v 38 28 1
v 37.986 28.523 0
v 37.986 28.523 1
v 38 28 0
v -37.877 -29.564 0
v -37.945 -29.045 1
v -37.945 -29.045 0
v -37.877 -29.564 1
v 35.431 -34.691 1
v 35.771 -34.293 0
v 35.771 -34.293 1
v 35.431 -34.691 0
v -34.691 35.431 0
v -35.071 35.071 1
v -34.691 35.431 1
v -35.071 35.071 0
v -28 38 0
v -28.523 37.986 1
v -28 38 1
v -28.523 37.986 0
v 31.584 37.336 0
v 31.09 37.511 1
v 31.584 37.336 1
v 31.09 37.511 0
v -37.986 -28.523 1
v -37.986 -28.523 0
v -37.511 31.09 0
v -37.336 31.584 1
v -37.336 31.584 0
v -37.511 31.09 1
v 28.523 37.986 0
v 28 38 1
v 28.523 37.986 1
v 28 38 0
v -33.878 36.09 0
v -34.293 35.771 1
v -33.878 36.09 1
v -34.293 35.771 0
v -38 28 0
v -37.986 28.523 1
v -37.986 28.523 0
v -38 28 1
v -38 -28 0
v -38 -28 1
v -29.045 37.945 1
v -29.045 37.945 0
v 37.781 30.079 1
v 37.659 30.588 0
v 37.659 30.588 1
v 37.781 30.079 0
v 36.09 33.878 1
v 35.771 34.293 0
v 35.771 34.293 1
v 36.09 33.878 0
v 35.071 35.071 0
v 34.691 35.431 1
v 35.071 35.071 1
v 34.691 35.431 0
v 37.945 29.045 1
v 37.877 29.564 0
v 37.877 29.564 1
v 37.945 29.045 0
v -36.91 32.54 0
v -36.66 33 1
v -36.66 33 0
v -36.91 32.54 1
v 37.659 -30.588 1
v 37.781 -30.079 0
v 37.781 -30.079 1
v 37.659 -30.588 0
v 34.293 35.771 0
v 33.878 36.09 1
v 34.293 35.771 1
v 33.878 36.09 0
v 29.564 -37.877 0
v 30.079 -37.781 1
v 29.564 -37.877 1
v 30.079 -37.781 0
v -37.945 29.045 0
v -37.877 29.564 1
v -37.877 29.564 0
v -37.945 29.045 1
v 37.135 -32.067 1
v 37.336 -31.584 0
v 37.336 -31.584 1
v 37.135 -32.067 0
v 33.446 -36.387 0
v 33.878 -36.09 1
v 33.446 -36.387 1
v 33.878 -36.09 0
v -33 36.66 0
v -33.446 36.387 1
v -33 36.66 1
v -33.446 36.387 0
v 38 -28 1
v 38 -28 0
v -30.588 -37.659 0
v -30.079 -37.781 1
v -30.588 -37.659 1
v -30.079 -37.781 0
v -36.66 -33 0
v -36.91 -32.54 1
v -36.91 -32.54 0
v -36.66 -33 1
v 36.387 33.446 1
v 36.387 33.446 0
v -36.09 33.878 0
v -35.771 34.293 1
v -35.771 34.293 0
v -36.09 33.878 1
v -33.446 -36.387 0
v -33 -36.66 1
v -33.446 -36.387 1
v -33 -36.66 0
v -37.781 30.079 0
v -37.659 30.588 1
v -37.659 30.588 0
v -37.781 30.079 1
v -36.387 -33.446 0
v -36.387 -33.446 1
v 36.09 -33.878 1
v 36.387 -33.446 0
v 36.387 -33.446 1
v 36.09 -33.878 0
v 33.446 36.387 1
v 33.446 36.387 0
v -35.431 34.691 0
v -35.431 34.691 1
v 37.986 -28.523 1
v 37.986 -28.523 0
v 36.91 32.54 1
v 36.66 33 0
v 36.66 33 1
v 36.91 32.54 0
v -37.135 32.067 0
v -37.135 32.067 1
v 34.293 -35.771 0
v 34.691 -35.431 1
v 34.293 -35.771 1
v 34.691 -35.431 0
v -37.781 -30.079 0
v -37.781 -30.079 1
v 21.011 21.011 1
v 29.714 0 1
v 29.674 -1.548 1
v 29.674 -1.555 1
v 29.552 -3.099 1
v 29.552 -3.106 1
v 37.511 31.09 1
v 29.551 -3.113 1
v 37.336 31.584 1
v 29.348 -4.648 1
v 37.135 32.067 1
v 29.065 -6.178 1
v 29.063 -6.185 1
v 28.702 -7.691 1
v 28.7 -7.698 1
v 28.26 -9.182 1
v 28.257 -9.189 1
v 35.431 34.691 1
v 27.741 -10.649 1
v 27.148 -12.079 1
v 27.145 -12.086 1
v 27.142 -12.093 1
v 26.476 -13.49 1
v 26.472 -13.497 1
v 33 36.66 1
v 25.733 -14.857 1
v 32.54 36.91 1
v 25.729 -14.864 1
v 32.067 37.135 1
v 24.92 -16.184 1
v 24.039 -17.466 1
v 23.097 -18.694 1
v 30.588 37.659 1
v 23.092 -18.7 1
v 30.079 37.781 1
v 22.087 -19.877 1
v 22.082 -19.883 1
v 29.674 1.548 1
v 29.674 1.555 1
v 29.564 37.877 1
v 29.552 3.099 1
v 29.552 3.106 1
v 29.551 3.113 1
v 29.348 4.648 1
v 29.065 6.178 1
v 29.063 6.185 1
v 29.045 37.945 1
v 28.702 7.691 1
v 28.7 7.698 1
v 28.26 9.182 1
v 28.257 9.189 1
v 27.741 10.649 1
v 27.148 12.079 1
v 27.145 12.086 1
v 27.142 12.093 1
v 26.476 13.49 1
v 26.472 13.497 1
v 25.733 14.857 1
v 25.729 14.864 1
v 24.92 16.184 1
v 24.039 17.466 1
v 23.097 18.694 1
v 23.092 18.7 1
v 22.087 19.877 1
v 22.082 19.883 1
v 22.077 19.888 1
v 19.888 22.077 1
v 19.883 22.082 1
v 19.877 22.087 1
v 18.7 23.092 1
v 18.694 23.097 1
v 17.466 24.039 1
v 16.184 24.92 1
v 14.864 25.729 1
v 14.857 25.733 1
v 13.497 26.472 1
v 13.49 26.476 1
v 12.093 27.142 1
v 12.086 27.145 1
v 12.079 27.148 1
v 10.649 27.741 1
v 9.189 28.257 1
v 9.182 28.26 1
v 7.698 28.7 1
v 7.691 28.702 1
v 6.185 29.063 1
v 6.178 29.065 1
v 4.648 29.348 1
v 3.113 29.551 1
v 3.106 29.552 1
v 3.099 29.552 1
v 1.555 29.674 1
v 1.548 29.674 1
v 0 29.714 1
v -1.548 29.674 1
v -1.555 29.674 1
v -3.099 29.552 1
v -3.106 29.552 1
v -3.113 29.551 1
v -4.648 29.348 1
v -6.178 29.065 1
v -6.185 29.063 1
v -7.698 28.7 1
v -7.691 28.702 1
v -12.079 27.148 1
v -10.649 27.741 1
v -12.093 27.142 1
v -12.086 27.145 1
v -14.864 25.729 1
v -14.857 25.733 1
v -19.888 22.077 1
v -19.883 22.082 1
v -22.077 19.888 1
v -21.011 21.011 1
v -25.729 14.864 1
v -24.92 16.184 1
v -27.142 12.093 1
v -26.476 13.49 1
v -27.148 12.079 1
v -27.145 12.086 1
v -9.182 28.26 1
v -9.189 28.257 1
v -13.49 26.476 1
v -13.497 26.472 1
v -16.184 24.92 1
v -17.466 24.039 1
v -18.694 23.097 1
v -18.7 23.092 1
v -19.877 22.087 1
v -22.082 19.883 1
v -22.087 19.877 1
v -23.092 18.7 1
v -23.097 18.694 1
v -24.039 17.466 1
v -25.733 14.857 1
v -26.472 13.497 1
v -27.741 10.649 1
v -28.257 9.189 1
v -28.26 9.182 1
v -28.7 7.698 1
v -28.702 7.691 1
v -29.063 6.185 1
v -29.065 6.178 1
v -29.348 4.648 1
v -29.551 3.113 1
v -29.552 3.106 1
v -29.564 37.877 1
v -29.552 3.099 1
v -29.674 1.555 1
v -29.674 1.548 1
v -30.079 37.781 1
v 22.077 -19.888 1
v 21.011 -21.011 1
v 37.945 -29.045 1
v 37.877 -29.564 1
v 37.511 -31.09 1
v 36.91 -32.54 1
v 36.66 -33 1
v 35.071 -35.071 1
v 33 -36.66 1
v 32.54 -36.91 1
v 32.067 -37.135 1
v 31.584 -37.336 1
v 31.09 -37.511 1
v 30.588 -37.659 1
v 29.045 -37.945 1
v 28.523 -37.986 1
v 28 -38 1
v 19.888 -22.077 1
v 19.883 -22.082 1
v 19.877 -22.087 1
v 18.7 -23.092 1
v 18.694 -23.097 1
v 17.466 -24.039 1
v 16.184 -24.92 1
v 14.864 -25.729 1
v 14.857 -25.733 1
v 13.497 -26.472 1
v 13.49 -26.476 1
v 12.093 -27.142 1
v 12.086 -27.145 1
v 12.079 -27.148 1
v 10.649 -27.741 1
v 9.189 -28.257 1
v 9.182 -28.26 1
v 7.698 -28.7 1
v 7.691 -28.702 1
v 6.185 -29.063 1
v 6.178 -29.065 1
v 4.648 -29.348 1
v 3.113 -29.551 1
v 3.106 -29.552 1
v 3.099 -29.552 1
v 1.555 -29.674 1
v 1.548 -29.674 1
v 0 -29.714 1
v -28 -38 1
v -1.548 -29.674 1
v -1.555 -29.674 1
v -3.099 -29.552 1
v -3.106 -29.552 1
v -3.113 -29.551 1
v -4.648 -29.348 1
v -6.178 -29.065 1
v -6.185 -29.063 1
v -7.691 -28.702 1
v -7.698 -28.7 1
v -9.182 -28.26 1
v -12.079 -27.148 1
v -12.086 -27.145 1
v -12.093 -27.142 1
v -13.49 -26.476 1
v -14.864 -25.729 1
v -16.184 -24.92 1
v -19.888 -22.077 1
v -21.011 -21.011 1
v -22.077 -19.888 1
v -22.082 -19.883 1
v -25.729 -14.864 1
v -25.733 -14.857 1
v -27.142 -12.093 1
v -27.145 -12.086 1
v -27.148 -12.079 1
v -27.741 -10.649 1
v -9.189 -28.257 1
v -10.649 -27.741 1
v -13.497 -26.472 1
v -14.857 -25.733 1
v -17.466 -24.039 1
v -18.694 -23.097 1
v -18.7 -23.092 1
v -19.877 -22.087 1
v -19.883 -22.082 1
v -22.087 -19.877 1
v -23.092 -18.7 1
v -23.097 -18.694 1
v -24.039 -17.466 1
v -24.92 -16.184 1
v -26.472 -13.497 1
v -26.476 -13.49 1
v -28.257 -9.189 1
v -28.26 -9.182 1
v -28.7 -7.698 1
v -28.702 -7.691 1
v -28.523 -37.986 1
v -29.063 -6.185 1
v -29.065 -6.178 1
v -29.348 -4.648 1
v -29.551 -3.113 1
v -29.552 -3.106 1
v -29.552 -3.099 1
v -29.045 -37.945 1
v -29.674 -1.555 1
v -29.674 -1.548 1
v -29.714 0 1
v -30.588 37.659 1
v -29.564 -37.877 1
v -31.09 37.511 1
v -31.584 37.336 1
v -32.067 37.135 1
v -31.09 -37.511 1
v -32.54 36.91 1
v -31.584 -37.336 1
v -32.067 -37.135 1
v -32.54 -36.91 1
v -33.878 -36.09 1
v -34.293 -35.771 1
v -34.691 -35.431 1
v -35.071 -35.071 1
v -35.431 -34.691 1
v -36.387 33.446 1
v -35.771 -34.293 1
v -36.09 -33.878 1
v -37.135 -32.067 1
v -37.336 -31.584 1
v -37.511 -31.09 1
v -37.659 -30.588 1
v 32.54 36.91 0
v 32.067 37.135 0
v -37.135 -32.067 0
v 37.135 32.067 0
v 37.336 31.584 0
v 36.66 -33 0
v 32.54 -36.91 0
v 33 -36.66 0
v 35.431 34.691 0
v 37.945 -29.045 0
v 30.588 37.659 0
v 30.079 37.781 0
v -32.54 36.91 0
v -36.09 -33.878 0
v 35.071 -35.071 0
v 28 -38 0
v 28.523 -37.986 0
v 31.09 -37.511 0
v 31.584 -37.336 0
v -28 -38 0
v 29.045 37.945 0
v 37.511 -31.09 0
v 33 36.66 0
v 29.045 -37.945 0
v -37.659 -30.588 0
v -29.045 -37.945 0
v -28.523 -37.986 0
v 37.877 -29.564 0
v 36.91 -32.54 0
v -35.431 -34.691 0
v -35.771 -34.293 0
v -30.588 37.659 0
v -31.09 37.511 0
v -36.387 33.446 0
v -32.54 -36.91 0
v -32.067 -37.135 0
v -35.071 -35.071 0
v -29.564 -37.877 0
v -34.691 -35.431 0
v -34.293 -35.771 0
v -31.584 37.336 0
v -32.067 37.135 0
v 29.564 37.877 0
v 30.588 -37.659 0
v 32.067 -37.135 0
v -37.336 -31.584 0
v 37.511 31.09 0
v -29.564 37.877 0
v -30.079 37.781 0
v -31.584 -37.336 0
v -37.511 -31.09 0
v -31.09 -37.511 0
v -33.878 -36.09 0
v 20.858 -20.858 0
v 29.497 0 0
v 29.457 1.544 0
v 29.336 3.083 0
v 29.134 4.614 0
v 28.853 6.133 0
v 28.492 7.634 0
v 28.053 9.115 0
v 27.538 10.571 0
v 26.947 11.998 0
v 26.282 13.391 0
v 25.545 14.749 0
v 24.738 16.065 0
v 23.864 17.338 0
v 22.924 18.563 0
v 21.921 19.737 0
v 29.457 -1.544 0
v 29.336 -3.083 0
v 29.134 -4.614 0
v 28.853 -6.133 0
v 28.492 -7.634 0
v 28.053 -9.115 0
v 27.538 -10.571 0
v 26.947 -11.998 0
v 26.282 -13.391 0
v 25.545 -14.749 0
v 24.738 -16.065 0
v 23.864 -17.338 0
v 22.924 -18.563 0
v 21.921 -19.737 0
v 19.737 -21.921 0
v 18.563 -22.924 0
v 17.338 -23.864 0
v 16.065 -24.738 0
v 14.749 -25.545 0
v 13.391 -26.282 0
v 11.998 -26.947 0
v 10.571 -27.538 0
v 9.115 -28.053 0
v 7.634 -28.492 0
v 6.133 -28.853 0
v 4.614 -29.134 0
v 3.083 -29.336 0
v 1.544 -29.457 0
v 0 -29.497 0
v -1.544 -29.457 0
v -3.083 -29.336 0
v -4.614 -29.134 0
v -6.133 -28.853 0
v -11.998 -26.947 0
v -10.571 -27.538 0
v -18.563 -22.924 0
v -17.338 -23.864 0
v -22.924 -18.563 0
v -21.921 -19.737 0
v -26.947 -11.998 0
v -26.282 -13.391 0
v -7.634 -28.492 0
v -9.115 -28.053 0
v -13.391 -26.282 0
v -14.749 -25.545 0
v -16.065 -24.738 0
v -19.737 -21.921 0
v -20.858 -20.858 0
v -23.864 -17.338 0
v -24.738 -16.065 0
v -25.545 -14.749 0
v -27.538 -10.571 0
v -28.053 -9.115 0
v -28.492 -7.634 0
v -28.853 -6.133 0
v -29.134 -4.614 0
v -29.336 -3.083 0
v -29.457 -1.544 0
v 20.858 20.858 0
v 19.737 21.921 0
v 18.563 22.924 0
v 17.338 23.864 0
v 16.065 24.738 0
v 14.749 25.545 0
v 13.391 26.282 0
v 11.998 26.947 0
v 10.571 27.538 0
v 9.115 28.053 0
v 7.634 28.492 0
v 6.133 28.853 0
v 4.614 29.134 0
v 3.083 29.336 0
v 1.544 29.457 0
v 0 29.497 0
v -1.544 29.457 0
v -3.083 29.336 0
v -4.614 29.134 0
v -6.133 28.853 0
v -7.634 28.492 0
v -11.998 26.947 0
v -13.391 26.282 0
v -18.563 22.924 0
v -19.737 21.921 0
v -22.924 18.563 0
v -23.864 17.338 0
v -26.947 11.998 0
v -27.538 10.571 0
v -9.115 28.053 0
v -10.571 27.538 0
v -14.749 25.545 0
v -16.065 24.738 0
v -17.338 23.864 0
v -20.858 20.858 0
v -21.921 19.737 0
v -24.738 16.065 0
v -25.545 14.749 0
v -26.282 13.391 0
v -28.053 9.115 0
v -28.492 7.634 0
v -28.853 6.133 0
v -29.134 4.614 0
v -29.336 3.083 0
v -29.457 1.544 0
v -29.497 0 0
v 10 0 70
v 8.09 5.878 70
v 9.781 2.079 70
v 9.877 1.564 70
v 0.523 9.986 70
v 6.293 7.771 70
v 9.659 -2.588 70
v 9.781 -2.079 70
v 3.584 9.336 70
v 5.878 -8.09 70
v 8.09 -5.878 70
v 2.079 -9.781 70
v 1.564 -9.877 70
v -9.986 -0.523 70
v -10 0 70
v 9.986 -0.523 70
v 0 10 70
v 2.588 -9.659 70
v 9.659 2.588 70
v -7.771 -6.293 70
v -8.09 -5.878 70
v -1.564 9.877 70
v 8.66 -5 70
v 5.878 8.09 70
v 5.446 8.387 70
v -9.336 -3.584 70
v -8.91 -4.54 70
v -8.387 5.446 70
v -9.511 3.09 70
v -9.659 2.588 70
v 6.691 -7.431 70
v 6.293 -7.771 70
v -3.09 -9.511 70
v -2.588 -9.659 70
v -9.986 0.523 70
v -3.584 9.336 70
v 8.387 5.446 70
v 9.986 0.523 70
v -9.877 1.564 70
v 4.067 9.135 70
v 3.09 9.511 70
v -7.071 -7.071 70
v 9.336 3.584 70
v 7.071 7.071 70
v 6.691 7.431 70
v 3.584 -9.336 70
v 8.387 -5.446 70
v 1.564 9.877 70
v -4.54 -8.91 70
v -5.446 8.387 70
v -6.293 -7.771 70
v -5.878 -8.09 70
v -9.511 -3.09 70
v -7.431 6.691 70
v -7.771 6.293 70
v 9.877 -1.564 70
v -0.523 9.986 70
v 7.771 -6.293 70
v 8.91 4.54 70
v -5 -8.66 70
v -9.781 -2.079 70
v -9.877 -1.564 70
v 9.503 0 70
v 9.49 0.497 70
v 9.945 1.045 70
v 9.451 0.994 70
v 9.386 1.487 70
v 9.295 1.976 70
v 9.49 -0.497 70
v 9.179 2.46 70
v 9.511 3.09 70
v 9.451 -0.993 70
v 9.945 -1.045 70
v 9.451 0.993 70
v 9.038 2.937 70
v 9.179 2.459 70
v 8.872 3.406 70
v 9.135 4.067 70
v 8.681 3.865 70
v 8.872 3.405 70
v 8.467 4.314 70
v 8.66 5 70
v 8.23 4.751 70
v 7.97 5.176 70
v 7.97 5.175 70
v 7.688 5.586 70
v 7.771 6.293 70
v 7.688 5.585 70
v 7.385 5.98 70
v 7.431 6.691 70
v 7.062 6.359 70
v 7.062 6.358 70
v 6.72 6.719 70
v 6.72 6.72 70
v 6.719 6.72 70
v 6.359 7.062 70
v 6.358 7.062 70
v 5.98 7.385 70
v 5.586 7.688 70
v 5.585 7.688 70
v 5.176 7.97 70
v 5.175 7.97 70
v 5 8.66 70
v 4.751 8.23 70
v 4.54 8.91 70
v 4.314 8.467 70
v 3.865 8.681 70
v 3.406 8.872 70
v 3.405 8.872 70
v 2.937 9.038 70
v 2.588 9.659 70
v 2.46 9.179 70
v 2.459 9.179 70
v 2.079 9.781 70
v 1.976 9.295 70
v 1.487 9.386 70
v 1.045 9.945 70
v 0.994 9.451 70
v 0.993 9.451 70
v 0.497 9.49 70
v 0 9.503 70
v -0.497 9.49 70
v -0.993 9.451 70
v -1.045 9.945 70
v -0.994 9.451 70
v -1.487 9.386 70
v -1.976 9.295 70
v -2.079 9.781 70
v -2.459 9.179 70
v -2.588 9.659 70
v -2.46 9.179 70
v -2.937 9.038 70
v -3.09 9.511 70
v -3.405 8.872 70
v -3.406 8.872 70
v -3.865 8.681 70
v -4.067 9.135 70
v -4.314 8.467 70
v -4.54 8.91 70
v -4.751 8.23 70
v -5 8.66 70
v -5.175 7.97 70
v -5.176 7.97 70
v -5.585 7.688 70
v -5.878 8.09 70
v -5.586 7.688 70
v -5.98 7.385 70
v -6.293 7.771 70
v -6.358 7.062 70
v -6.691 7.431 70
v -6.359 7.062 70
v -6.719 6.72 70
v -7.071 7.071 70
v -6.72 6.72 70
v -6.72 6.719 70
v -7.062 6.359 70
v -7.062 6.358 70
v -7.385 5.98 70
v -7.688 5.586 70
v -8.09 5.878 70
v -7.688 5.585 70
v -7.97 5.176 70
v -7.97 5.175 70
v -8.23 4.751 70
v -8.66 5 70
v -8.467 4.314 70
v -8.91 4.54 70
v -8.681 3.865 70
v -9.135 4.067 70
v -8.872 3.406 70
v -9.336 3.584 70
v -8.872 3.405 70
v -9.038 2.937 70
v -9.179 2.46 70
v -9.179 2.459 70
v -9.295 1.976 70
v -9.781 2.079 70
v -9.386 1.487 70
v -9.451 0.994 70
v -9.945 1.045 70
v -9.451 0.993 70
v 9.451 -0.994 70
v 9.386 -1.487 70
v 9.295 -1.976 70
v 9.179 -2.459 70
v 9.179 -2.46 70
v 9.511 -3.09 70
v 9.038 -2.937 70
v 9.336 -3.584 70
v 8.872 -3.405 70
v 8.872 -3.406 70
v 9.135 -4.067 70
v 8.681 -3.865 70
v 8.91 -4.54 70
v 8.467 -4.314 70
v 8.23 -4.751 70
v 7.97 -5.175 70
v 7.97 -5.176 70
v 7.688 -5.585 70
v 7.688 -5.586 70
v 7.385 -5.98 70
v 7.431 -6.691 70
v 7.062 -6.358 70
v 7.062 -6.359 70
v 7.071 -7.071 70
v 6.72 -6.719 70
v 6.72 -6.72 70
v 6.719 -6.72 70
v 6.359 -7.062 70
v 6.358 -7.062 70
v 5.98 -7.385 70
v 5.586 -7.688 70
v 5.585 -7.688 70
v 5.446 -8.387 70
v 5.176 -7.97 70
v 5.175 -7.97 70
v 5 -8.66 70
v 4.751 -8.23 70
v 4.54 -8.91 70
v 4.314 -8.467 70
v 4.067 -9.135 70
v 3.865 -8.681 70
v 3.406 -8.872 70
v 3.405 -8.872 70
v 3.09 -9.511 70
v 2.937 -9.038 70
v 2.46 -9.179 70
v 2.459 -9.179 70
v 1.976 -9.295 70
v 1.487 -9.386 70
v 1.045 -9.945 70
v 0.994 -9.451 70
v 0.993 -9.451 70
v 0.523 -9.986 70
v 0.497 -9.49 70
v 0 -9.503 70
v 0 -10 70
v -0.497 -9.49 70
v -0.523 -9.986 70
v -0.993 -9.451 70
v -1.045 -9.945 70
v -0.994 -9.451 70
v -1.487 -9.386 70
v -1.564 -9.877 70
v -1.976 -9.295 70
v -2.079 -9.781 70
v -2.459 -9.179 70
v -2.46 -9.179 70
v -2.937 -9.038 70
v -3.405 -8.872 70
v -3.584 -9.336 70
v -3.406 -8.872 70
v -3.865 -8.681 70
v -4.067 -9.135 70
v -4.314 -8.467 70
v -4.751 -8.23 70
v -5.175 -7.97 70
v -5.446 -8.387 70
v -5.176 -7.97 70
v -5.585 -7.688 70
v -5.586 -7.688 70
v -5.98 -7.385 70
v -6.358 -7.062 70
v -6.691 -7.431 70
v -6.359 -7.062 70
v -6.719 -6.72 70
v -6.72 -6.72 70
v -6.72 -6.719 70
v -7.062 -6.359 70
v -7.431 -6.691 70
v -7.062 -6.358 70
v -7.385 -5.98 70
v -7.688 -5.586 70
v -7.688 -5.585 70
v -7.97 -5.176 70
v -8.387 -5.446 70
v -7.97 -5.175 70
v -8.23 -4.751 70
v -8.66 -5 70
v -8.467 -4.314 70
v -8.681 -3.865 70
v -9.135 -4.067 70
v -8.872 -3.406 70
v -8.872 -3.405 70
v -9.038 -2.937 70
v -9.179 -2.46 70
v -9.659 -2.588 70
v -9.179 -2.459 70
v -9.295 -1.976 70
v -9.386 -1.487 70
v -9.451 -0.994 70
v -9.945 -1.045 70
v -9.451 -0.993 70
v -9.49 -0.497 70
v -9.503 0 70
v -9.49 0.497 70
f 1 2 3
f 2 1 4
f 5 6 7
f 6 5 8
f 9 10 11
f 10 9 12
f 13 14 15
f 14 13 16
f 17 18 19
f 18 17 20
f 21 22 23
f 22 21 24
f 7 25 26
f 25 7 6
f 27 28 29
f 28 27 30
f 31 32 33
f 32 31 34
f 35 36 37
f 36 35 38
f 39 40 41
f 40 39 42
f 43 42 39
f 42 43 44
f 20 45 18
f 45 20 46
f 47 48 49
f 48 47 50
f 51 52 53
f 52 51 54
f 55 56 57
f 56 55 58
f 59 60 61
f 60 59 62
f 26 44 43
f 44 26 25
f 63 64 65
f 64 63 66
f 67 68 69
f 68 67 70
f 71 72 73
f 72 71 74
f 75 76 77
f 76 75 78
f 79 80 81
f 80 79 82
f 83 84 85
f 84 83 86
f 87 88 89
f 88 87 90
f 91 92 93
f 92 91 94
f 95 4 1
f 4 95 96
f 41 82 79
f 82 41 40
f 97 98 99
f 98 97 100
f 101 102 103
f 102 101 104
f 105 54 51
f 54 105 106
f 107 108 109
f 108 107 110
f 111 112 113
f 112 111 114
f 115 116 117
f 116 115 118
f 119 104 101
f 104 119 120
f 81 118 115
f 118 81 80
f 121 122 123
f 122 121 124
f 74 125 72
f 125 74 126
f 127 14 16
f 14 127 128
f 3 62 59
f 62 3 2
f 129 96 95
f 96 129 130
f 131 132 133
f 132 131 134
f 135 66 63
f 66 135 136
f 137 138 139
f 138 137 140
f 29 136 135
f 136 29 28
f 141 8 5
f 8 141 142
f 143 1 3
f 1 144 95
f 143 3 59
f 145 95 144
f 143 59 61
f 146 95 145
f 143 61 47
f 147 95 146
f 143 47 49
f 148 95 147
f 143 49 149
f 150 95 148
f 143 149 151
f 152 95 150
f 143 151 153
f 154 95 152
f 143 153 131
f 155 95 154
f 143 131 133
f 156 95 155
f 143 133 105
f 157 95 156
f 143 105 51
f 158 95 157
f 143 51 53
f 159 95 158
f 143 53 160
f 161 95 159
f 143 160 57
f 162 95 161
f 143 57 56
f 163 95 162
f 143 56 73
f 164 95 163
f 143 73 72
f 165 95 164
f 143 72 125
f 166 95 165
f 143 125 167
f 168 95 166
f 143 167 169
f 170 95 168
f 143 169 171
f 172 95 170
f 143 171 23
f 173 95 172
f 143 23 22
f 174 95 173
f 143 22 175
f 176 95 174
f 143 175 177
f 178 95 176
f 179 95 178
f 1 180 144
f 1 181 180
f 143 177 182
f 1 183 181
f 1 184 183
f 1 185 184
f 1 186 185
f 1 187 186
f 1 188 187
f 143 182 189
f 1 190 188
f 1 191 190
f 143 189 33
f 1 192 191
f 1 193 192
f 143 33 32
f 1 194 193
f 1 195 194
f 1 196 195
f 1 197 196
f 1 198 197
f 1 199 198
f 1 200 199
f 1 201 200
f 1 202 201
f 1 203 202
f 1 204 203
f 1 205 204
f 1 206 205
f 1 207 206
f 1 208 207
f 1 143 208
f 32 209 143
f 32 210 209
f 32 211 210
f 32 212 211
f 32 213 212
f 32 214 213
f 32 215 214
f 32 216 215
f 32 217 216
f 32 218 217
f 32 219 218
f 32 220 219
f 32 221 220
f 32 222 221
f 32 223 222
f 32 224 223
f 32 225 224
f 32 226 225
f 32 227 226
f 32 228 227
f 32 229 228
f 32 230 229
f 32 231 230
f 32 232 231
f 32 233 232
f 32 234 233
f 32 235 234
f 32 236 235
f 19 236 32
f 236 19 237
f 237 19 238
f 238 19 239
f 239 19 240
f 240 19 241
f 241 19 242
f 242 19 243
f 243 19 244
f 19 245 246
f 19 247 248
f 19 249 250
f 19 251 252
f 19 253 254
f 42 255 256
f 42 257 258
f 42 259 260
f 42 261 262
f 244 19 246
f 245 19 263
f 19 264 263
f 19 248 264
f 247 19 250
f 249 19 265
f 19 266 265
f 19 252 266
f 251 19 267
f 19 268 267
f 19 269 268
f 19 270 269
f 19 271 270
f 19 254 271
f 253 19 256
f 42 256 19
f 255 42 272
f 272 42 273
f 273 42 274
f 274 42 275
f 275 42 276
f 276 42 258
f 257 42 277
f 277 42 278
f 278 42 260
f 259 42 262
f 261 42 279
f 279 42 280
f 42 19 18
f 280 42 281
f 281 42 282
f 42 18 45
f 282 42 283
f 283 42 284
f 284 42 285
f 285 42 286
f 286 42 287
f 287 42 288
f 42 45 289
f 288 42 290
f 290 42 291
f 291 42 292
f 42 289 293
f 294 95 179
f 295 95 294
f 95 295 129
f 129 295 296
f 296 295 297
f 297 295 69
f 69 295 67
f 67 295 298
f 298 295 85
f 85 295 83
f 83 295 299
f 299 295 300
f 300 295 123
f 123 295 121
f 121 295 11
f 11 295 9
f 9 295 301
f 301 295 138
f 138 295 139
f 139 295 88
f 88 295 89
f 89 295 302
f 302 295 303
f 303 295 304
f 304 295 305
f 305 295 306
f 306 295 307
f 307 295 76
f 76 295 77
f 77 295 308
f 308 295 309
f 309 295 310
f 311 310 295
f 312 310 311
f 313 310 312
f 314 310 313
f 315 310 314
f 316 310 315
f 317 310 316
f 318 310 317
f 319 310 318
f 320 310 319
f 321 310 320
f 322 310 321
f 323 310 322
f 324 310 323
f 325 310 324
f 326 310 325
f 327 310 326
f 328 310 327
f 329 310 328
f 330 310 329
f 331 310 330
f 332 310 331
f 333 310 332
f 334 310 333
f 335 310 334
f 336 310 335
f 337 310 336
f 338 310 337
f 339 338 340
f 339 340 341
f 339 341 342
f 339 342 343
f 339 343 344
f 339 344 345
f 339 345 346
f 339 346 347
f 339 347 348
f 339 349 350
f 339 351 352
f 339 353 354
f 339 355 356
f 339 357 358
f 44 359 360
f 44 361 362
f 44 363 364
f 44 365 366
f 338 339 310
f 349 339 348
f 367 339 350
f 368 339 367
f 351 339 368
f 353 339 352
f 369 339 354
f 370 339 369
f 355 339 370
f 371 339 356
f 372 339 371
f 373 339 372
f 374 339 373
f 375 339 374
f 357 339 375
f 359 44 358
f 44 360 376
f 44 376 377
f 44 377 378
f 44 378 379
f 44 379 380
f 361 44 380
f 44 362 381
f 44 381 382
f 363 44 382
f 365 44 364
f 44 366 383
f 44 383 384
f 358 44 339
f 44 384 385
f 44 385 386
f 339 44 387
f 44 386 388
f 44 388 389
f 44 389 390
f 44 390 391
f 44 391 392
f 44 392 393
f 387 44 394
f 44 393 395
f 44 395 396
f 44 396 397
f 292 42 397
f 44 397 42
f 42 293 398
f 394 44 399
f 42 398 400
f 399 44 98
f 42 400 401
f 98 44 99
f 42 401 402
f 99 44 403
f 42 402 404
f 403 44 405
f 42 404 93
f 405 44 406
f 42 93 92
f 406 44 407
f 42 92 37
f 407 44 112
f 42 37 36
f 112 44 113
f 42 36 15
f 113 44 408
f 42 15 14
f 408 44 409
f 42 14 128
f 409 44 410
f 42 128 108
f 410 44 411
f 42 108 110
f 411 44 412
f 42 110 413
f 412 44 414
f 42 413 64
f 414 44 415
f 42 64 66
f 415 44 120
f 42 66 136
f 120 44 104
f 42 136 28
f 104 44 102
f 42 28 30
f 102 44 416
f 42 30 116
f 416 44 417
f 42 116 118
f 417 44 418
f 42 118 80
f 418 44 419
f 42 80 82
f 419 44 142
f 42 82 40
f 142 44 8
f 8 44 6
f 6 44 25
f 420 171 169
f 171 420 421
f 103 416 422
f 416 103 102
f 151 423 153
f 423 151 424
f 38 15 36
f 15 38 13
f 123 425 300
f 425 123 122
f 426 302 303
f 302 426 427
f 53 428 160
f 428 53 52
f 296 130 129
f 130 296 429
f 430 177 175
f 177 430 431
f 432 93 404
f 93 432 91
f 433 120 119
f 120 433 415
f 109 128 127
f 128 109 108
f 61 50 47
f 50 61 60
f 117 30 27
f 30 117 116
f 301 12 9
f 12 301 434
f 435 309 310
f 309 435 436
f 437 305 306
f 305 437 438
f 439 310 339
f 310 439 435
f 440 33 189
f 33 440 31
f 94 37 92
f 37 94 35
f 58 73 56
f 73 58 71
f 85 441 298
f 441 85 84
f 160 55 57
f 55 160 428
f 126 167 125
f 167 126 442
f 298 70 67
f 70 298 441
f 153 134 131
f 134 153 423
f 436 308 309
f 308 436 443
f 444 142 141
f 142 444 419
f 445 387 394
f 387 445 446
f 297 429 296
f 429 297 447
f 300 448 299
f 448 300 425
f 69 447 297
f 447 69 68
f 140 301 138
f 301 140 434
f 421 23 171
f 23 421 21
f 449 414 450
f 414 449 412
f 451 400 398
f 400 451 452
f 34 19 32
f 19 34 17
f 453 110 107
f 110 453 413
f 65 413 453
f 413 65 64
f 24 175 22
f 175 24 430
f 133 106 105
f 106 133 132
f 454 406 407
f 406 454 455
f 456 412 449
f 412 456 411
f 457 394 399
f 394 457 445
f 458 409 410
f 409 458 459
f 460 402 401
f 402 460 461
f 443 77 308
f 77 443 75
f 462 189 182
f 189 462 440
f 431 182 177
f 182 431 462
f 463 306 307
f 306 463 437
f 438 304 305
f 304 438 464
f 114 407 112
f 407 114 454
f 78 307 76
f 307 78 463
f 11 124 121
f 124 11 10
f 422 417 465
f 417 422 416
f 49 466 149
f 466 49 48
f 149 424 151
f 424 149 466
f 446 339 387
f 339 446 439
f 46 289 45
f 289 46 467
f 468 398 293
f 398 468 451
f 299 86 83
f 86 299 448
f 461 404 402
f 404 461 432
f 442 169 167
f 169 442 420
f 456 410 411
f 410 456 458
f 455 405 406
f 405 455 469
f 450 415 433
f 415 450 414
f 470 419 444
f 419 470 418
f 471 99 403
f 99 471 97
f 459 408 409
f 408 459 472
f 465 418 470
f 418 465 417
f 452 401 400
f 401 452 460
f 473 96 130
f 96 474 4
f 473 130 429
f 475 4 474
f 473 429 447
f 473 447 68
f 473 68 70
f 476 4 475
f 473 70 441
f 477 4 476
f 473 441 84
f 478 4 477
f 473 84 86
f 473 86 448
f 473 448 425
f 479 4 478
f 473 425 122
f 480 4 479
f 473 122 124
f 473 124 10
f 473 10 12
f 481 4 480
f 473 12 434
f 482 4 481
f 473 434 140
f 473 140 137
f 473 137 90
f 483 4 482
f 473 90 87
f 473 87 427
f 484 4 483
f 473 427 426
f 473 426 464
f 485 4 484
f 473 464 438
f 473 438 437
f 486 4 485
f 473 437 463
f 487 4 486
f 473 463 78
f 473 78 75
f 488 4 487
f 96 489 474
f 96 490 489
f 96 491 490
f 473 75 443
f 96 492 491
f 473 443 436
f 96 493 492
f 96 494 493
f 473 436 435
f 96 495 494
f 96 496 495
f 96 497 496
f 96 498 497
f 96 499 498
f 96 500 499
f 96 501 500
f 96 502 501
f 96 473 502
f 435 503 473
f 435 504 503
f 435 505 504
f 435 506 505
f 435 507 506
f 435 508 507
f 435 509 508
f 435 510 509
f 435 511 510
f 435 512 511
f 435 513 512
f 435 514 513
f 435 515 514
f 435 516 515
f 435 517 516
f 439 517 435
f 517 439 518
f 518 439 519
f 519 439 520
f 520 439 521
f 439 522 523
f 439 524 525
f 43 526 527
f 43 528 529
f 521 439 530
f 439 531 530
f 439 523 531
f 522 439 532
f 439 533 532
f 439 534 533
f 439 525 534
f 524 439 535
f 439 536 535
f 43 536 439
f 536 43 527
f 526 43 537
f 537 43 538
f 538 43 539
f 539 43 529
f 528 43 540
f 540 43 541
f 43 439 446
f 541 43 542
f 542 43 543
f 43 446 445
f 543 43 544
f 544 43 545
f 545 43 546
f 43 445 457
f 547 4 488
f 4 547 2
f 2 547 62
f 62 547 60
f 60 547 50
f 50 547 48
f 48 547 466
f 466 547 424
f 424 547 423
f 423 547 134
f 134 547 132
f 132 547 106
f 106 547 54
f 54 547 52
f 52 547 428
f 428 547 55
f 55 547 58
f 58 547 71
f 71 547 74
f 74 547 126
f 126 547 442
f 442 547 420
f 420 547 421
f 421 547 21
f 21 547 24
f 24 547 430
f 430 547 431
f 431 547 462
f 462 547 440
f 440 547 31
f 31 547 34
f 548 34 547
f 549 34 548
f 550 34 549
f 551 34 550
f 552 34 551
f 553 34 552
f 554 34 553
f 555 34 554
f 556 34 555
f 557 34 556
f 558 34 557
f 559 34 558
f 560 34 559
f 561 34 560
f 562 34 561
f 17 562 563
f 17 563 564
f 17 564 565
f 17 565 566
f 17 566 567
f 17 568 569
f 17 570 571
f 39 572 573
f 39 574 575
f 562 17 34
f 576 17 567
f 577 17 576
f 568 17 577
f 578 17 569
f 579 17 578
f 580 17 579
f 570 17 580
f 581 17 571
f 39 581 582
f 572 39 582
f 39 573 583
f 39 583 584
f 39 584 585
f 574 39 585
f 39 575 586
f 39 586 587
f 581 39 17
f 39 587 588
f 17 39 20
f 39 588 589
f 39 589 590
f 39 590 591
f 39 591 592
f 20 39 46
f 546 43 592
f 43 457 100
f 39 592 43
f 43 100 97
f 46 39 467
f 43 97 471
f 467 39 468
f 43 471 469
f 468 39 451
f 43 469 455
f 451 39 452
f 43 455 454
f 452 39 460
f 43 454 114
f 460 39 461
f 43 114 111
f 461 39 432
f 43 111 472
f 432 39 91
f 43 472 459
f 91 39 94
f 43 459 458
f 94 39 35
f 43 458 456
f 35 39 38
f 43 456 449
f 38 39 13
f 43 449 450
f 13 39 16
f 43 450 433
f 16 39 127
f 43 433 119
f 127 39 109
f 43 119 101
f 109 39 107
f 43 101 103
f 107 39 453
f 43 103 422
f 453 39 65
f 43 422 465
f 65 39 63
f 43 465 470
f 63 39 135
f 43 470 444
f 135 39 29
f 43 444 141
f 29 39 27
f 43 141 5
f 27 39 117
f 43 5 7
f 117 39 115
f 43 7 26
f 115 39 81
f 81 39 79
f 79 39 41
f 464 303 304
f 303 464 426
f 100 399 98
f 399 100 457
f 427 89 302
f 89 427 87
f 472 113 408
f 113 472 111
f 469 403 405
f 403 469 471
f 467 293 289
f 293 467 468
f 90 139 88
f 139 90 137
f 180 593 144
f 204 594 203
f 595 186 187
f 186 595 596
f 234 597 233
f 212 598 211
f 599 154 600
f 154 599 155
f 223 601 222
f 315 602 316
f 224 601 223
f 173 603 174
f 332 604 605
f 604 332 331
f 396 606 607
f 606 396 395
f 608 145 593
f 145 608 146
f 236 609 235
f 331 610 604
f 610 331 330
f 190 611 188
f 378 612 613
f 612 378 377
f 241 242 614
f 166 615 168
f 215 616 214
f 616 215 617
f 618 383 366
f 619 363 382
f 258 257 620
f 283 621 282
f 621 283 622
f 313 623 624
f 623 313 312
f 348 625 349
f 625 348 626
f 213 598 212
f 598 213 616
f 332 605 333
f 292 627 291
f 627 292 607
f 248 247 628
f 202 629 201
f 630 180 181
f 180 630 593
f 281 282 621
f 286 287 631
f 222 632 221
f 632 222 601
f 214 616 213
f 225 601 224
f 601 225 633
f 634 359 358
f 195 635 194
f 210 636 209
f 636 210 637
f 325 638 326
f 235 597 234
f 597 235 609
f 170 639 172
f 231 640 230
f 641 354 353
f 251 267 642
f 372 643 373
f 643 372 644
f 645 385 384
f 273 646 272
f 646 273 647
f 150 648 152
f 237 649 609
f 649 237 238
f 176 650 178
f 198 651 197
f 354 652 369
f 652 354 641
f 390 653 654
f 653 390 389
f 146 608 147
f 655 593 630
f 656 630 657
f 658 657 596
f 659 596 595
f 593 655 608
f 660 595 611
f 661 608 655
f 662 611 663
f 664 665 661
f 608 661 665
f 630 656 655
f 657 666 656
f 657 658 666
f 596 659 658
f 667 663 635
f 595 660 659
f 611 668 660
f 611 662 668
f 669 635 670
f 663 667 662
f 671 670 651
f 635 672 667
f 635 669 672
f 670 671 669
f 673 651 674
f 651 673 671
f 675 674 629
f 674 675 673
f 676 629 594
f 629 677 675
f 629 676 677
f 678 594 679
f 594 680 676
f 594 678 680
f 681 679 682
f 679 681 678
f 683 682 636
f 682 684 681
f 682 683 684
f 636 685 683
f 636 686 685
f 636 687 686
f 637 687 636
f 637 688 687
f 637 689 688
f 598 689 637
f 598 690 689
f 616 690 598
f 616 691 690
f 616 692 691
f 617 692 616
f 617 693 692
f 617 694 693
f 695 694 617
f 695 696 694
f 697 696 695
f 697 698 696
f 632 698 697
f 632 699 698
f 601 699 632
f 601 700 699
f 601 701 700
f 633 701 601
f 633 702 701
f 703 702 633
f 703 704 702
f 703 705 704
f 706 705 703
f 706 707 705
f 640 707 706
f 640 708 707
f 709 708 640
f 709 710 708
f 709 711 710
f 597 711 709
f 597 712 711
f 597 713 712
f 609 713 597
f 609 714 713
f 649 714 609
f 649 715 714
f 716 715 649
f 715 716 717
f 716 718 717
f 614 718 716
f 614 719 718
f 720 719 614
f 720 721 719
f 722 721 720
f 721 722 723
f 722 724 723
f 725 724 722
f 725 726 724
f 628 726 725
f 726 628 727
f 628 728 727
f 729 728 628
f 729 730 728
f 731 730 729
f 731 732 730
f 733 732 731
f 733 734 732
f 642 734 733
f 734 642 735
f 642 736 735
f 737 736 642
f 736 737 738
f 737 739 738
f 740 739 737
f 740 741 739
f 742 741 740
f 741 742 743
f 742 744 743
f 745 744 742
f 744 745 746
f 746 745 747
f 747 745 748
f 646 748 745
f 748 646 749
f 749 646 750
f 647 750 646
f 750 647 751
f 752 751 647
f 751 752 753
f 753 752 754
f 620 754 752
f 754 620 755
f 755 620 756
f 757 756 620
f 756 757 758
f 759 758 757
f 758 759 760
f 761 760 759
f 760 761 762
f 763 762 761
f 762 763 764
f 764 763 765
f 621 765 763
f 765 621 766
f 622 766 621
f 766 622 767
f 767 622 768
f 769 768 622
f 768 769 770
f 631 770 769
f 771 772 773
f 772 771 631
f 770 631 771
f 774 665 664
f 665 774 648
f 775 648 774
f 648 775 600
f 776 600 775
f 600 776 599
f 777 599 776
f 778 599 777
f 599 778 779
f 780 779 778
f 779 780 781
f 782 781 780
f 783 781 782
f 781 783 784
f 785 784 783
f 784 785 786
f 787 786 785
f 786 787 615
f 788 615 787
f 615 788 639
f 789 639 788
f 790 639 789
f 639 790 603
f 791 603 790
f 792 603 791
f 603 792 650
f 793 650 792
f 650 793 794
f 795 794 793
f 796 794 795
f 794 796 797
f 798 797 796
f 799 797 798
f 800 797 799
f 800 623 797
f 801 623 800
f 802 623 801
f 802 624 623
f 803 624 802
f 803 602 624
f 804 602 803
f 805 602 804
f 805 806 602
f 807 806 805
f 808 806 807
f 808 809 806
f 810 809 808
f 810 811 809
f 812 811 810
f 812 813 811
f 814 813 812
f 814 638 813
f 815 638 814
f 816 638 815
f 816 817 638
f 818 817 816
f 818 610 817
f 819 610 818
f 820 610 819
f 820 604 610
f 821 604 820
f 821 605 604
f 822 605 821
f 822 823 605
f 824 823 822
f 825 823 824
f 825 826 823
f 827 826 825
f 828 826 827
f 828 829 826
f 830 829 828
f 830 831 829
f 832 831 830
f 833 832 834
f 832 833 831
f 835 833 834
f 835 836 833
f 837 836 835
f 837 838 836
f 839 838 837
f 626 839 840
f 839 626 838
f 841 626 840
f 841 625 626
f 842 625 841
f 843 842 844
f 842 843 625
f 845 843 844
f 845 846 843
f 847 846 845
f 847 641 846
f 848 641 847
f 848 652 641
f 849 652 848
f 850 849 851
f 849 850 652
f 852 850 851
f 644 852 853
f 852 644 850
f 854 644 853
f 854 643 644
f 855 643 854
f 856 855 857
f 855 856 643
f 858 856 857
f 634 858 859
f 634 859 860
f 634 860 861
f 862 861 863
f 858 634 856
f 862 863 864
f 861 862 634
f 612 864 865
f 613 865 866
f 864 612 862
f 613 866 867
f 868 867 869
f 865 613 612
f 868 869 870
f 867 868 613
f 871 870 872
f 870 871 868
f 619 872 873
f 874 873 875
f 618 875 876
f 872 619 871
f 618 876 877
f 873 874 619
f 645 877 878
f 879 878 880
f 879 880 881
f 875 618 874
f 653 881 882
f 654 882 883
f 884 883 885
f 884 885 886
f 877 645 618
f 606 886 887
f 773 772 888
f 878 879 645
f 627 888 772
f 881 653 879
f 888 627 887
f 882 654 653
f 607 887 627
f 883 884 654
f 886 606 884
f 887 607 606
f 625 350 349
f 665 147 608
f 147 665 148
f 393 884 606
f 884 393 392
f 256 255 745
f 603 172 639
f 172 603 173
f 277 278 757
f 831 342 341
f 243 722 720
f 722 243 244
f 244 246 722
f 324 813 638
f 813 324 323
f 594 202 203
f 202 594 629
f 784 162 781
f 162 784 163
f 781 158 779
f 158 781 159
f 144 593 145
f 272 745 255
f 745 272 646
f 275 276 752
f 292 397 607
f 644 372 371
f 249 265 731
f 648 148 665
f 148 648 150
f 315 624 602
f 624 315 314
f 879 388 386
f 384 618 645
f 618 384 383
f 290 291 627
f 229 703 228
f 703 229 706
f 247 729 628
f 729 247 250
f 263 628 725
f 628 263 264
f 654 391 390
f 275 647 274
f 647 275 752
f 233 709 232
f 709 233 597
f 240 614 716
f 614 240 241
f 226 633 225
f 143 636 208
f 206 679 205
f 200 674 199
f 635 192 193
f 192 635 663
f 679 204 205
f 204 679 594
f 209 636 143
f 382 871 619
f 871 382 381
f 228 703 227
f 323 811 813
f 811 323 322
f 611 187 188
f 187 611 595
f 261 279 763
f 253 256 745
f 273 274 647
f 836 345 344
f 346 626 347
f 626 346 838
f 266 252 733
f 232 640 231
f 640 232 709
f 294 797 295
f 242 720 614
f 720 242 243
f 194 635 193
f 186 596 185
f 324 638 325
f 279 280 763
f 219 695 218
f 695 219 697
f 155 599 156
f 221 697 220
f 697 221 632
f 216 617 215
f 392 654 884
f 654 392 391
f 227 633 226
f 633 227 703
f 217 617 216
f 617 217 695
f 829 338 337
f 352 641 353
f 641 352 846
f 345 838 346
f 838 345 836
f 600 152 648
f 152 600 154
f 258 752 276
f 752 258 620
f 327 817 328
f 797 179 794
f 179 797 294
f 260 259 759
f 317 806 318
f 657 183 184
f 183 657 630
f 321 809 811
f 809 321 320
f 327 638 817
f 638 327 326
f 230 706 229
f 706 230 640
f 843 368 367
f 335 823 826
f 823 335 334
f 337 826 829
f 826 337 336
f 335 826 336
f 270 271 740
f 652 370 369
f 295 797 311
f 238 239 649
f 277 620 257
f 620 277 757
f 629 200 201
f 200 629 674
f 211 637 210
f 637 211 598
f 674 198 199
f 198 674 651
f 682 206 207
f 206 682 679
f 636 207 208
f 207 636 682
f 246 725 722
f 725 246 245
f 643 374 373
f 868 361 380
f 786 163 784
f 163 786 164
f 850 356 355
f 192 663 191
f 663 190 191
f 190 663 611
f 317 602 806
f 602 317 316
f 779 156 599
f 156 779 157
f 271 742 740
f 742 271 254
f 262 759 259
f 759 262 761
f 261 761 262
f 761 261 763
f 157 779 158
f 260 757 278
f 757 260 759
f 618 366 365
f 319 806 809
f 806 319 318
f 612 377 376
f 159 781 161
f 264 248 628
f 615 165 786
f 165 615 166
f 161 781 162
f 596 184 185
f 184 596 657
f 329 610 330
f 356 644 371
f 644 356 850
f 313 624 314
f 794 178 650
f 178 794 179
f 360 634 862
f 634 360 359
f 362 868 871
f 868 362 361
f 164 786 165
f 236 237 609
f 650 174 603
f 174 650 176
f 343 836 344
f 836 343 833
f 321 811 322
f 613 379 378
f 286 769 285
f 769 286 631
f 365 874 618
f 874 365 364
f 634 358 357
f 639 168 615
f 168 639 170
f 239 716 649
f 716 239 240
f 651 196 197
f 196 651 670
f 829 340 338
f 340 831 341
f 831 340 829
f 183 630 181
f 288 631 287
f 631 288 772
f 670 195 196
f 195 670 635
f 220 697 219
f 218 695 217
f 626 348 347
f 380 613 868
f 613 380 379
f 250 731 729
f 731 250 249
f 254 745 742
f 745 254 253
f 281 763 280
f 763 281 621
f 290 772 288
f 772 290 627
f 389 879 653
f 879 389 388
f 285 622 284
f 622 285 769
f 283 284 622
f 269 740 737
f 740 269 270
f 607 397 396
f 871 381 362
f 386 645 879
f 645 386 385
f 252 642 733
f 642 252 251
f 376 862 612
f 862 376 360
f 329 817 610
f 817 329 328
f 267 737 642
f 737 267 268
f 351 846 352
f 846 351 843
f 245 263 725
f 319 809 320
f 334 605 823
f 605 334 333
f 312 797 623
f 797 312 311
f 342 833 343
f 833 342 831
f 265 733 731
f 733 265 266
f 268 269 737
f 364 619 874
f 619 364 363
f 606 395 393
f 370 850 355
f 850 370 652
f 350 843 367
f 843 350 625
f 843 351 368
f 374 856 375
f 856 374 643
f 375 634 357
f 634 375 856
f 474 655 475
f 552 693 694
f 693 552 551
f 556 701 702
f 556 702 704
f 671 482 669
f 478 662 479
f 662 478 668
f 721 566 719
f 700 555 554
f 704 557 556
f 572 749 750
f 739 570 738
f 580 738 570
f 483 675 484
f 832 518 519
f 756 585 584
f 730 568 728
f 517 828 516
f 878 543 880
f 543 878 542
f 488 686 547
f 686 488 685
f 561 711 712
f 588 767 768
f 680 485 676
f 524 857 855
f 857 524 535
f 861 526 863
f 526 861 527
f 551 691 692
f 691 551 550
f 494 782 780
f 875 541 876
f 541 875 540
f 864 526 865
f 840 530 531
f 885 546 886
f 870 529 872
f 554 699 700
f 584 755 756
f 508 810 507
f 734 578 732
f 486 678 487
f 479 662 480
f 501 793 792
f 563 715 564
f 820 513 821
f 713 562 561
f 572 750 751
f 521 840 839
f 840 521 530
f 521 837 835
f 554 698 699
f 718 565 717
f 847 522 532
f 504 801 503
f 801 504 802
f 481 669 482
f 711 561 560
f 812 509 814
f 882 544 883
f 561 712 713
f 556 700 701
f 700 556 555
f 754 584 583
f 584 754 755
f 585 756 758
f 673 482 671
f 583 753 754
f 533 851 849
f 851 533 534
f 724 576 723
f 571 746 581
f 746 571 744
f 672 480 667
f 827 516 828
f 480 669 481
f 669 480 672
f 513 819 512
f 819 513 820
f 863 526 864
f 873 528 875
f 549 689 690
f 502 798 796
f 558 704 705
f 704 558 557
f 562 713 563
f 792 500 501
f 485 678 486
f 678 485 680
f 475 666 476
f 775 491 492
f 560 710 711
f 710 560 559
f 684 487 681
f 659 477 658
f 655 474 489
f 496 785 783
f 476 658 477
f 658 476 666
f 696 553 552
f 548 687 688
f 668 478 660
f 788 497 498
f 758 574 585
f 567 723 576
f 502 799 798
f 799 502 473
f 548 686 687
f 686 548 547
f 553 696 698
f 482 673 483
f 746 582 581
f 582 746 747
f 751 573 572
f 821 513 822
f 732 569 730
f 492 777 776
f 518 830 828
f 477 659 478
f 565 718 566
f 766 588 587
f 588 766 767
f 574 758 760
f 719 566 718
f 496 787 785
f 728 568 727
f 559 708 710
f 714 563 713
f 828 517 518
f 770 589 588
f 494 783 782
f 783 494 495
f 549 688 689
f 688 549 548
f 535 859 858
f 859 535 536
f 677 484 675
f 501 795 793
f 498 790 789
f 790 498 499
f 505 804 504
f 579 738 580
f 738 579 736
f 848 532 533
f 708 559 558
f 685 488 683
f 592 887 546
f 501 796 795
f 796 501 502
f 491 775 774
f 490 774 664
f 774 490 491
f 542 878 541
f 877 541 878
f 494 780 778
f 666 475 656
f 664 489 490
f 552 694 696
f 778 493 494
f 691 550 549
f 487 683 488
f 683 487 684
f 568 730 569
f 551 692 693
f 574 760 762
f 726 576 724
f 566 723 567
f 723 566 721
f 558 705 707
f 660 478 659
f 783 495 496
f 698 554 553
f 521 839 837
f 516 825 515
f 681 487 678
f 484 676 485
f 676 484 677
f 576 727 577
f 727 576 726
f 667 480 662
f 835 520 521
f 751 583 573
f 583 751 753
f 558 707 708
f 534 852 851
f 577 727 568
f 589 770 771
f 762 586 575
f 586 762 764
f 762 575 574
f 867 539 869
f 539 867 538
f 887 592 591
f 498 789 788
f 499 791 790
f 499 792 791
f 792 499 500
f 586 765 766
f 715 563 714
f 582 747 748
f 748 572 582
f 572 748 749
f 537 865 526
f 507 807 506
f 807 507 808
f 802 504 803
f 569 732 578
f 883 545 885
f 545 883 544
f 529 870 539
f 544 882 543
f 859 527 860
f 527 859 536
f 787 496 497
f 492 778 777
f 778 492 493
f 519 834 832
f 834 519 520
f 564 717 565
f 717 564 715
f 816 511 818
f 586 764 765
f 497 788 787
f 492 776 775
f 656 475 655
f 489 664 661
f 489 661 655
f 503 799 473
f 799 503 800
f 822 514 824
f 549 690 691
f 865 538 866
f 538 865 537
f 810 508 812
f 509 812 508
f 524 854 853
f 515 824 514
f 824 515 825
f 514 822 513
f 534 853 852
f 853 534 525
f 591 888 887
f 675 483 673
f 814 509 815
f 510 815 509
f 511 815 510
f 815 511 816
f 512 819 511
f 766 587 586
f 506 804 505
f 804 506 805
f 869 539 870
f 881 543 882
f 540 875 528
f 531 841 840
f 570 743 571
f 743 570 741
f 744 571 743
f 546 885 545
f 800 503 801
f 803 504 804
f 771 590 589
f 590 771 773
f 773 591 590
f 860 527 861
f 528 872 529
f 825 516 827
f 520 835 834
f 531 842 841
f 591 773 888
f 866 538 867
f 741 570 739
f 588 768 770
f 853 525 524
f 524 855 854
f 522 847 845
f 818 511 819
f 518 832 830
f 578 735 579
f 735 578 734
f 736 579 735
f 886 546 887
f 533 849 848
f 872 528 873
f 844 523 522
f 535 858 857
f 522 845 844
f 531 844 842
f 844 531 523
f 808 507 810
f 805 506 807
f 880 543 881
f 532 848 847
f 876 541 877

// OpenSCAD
// V2: Parametric Traffic Cone by bikecyclist: https://www.thingiverse.com/thing:3052917
// V1: Traffic Cone by felixstdp: https://www.thingiverse.com/thing:1260767

//Height of the Traffic Cone
cone_height = 70;

//Diameter at the Base
cone_base_diameter = 60;

//Diameter at the Top
cone_tip_diameter = 20;     

//Wall Thickness
cone_wall = 0.5;            

//Height of the Square Base
base_height = 1; 

//Edge Length of the Square Base
base_edge = 76;

//Corner Radius of the Square Base
base_corner_radius = 10;

//Number of Facets. Try 4 for a diamond cone! :-D
$fn=120;

//Parameter to ensure proper meshing, normally no need to change it
epsilon = 0.01;

difference()
{
    union()
    {
        linear_extrude (base_height)
            hull ()
                for (i = [-1, 1])
                   for (j = [-1, 1])
                        translate([i * (base_edge/2 - base_corner_radius), j * (base_edge/2 - base_corner_radius),0])
                            circle(r = base_corner_radius);
                   
        cylinder (d1 = cone_base_diameter, d2 = cone_tip_diameter, h = cone_height);
    }
    
    translate([0,0,-epsilon])
        cylinder(d1 = cone_base_diameter - 2 * cone_wall, d2 = cone_tip_diameter - 2 * cone_wall, h = cone_height + 2 * epsilon);
}
